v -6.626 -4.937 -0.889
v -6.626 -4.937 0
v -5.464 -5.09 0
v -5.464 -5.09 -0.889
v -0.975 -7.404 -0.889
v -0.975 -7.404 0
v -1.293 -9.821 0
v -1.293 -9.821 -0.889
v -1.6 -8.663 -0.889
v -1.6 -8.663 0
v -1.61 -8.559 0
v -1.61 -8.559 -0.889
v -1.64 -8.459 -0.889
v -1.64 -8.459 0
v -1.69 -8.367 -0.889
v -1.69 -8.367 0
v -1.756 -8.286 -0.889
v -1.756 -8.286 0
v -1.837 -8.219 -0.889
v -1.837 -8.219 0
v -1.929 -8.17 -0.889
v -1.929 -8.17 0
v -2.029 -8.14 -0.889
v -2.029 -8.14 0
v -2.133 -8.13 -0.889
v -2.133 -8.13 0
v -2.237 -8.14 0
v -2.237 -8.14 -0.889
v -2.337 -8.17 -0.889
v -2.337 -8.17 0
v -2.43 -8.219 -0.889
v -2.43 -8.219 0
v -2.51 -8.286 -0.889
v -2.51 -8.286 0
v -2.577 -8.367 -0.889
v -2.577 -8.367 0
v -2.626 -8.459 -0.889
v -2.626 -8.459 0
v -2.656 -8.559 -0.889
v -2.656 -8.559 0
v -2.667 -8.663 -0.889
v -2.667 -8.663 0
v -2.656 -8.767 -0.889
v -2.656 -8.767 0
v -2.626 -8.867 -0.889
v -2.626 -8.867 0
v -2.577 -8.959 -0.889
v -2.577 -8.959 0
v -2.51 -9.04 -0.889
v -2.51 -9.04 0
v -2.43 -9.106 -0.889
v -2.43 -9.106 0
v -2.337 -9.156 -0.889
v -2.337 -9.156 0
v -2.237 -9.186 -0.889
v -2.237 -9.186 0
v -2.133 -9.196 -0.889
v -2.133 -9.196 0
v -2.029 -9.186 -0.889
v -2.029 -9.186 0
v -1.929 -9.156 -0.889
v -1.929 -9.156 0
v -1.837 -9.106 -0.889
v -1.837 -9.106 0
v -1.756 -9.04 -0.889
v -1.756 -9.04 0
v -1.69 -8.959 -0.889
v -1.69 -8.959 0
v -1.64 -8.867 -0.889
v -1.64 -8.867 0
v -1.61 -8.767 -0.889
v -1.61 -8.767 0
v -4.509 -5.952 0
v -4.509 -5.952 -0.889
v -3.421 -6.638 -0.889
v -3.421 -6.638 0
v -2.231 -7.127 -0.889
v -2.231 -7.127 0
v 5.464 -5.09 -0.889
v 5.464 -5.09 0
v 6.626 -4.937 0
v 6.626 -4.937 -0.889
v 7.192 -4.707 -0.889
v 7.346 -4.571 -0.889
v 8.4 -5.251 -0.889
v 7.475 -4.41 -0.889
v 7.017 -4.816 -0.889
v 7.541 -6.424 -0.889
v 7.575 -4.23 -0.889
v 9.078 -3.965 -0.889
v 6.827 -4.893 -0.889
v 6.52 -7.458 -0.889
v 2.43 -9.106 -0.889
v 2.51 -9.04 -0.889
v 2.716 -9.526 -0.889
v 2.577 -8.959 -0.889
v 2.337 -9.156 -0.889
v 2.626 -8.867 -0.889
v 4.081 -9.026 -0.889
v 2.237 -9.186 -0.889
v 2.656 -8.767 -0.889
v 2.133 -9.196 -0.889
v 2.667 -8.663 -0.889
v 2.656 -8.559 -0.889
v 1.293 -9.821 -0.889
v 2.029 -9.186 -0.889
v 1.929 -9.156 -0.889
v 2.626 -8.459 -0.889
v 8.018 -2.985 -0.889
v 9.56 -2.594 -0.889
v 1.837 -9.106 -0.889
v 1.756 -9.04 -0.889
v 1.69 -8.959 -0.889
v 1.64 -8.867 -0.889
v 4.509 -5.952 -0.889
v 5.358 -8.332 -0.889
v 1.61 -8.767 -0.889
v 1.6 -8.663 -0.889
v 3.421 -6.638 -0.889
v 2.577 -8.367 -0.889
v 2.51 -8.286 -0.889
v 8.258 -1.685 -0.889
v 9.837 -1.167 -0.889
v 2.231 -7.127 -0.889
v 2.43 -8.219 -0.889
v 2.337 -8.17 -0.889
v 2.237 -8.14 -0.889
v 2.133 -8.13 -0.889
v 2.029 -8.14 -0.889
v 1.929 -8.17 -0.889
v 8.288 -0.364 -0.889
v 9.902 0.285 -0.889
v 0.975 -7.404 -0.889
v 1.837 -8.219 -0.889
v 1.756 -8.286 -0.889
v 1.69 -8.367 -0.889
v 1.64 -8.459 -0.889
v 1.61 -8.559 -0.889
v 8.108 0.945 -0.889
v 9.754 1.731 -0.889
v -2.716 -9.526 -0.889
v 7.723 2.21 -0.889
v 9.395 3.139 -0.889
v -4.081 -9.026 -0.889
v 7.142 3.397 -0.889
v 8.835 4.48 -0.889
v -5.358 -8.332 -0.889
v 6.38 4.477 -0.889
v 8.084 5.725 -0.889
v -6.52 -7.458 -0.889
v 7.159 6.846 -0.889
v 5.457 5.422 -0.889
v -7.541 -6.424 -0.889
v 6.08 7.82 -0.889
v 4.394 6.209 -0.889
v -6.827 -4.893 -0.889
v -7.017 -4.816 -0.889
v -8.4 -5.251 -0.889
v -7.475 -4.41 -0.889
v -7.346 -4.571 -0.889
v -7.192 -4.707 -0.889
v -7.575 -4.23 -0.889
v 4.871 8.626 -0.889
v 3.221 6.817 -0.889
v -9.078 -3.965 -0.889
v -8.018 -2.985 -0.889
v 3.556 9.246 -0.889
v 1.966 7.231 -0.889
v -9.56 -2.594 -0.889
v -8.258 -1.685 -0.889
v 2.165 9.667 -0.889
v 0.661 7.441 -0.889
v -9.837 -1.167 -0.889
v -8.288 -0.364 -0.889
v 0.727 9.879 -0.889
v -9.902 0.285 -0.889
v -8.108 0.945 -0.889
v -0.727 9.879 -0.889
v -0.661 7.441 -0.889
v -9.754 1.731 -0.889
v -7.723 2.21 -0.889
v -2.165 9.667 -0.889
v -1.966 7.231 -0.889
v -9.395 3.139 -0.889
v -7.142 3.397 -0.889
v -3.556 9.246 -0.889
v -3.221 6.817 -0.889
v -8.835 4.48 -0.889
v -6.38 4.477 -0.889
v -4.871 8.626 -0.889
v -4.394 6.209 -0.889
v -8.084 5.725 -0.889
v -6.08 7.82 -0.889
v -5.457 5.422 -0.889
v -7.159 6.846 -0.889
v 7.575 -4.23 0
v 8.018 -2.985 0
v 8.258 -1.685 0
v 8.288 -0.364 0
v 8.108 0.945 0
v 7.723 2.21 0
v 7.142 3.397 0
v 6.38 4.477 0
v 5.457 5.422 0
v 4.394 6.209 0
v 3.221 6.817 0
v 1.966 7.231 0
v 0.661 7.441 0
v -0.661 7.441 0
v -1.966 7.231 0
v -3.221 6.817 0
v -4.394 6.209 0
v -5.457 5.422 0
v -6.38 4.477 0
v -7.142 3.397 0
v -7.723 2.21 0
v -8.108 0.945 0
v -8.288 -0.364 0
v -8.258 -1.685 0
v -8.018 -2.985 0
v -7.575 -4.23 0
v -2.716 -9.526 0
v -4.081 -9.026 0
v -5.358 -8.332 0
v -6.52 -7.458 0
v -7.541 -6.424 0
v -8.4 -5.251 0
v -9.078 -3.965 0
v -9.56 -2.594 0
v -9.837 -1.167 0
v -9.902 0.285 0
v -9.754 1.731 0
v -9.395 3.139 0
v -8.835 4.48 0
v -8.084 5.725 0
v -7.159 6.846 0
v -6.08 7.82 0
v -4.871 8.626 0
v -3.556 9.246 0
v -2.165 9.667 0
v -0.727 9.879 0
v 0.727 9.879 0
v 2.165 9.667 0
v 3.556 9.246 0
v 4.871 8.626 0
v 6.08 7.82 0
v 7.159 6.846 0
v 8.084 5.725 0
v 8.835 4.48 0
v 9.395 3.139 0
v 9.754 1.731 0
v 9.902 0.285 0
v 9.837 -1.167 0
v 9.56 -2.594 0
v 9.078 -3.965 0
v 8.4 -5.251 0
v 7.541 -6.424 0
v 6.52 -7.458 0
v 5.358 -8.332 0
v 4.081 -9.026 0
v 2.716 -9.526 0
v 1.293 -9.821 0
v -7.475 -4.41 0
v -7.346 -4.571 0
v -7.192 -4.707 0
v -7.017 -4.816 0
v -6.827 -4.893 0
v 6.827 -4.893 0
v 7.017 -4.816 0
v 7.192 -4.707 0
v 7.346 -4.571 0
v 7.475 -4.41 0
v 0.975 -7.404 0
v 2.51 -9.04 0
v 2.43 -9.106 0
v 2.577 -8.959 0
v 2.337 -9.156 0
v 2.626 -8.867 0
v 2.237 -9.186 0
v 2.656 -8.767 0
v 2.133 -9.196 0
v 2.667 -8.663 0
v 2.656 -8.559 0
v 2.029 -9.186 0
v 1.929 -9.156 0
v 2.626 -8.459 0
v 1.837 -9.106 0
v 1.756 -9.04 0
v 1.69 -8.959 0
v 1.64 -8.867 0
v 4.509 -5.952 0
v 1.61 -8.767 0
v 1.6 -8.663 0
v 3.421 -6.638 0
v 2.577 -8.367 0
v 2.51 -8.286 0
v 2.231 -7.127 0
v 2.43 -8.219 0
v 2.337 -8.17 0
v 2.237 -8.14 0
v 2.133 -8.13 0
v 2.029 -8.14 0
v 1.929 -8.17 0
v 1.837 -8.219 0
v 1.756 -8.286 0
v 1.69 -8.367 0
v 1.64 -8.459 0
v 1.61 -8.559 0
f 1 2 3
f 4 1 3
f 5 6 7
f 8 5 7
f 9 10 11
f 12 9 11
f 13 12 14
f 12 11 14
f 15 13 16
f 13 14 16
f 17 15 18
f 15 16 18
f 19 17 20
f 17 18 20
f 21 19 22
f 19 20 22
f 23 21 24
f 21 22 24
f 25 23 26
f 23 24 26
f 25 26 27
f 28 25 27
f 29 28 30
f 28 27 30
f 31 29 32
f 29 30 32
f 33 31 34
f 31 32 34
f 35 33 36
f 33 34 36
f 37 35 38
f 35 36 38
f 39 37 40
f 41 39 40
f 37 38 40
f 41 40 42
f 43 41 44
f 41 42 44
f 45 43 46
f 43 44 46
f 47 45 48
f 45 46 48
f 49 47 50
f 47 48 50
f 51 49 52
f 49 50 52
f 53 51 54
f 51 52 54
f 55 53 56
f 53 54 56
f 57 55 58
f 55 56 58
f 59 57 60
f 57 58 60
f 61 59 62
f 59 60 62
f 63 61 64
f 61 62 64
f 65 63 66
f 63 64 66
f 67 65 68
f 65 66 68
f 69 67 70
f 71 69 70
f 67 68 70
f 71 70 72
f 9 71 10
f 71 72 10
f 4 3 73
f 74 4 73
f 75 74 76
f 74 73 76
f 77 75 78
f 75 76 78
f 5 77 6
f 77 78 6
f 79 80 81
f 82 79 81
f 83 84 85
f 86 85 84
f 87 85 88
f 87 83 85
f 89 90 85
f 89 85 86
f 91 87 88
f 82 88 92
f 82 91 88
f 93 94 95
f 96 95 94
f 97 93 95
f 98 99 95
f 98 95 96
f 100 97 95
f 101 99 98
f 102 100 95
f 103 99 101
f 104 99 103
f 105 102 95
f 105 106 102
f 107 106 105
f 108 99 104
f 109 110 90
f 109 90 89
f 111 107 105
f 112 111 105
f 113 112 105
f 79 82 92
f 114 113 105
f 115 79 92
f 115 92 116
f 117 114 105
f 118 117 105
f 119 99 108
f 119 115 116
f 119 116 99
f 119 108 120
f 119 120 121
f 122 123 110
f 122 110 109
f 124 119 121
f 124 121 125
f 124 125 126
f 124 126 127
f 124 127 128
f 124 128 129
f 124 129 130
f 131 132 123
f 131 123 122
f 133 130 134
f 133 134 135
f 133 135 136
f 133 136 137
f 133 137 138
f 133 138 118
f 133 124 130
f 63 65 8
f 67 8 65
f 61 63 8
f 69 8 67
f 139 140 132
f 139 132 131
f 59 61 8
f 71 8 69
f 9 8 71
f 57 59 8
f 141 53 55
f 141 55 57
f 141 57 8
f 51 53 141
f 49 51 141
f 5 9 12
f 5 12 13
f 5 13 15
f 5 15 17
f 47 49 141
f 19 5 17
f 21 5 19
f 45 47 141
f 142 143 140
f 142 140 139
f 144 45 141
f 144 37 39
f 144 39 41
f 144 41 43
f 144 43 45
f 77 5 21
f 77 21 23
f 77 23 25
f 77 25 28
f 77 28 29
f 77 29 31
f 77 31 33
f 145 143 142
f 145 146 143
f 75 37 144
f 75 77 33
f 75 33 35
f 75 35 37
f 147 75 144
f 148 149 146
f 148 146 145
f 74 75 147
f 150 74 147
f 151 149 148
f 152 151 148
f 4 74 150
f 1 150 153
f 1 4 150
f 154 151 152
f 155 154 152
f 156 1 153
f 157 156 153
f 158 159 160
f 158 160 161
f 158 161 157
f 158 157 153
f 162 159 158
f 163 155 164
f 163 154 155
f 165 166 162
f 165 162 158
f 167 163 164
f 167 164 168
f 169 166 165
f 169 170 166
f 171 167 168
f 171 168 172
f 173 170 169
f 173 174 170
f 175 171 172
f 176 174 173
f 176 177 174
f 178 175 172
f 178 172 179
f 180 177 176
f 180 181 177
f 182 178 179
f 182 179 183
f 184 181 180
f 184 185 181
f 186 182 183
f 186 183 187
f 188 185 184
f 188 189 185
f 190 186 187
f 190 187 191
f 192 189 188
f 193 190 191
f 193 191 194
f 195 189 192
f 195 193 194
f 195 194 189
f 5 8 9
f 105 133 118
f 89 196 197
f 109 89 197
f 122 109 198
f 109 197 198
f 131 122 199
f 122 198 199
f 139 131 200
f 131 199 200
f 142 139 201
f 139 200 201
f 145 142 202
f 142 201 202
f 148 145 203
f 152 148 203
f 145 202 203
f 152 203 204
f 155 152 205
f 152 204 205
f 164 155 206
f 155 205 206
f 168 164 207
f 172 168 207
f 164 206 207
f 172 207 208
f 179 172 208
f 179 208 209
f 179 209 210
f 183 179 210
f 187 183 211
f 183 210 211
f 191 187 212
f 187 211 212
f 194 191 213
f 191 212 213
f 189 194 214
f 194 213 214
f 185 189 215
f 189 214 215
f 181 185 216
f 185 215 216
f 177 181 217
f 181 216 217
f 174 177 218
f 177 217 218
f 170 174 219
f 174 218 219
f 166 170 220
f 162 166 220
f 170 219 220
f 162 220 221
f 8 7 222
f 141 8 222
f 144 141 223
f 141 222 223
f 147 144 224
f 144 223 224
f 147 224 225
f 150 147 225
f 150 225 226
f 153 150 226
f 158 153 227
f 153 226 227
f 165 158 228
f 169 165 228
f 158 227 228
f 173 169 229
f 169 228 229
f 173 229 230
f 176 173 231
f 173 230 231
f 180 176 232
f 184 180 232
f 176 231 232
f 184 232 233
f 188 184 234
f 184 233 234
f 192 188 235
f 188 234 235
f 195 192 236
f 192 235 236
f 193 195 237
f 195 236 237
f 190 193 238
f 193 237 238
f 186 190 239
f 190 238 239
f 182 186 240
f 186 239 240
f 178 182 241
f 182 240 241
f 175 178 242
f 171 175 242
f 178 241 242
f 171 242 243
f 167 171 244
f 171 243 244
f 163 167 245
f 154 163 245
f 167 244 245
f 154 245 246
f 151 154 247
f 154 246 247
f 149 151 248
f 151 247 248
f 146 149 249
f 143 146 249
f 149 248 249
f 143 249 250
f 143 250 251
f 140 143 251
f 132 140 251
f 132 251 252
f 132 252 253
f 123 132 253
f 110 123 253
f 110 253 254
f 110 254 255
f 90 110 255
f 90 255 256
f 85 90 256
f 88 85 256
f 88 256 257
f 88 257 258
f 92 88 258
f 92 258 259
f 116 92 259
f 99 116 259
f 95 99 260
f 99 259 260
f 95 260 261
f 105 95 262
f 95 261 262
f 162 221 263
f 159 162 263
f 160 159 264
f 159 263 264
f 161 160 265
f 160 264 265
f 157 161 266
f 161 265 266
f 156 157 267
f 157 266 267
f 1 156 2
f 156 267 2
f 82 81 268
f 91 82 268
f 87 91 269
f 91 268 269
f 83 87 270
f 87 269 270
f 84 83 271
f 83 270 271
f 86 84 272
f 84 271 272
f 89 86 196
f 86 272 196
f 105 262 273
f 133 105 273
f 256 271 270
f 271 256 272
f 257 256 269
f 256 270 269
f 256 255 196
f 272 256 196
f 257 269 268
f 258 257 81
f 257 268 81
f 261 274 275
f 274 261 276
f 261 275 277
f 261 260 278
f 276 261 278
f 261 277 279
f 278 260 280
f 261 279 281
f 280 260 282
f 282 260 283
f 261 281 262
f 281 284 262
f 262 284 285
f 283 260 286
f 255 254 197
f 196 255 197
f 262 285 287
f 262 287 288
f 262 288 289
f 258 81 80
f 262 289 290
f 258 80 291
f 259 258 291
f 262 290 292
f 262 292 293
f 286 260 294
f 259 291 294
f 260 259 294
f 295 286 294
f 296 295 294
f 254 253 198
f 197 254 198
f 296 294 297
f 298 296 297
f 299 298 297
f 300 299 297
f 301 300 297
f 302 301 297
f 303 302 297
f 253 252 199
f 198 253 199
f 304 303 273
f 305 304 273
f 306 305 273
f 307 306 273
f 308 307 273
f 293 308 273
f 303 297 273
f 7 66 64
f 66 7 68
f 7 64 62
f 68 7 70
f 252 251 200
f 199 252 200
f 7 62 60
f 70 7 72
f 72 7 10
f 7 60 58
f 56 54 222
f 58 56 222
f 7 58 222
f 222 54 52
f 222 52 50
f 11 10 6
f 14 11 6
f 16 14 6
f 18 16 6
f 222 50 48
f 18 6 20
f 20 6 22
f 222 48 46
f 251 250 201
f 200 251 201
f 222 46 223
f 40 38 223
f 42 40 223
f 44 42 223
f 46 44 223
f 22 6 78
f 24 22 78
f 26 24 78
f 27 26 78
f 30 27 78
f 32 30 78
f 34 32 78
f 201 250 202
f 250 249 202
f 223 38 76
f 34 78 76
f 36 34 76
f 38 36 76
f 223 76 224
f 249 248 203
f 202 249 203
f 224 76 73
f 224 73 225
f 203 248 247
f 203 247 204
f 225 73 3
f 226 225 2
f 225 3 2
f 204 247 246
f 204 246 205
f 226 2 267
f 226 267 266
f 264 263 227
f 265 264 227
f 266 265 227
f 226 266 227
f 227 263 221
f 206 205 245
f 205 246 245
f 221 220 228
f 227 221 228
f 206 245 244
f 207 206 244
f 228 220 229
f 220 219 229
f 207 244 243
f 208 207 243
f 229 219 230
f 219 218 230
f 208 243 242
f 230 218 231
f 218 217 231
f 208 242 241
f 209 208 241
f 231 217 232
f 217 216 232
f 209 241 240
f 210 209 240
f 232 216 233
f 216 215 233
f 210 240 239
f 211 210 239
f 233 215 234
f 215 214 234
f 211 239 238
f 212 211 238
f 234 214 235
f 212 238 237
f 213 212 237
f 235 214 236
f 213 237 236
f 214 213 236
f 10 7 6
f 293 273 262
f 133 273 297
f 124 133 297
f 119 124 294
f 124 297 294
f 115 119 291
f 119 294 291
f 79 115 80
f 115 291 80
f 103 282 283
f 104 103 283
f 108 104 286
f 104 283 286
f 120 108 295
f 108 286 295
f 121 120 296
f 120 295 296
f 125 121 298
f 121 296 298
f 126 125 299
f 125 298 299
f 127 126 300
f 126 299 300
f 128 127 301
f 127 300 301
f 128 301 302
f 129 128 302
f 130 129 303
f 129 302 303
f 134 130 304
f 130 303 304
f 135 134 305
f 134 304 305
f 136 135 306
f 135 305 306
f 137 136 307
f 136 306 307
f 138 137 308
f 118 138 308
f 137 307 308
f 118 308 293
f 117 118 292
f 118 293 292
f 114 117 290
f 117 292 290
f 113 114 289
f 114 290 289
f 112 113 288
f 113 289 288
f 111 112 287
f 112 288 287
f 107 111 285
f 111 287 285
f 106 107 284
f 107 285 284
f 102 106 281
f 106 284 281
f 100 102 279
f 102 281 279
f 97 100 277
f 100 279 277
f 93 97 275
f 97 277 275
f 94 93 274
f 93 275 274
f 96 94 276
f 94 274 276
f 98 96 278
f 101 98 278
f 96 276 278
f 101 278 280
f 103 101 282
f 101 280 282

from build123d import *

# Parameters (mm, degrees)
BODYSKE_R  = 0.5334
BODY_DEPTH = 0.889


with BuildPart() as part:
    # BodySke → Body (new body)
    with BuildSketch(Plane.XY):
        with BuildLine():
            Line((-0.974717393, -7.403713647), (-1.29299246, -9.821252797))
            ThreePointArc((-1.29299246, -9.821252797), (0, 9.906), (1.29299246, -9.821252797))
            Line((1.29299246, -9.821252797), (0.974717393, -7.403713647))
            ThreePointArc((0.974717393, -7.403713647), (3.420903654, -6.63795661), (5.464040708, -5.090118751))
            Line((5.464040708, -5.090118751), (6.625562126, -4.937201555))
            ThreePointArc((6.625562126, -4.937201555), (7.192072795, -4.707317059), (7.574660301, -4.230443889))
            ThreePointArc((7.574660301, -4.230443889), (0, 7.4676), (-7.574660301, -4.230443889))
            ThreePointArc((-7.574660301, -4.230443889), (-7.192072795, -4.707317059), (-6.625562126, -4.937201555))
            Line((-6.625562126, -4.937201555), (-5.464040708, -5.090118751))
            ThreePointArc((-5.464040708, -5.090118751), (-3.420903654, -6.63795661), (-0.974717393, -7.403713647))
        make_face()
        with Locations((2.133243521, -8.662961107)):
            Circle(BODYSKE_R, mode=Mode.SUBTRACT)
        with Locations((-2.133243521, -8.662961107)):
            Circle(BODYSKE_R, mode=Mode.SUBTRACT)
    extrude(amount=-BODY_DEPTH)


solid = part.part
